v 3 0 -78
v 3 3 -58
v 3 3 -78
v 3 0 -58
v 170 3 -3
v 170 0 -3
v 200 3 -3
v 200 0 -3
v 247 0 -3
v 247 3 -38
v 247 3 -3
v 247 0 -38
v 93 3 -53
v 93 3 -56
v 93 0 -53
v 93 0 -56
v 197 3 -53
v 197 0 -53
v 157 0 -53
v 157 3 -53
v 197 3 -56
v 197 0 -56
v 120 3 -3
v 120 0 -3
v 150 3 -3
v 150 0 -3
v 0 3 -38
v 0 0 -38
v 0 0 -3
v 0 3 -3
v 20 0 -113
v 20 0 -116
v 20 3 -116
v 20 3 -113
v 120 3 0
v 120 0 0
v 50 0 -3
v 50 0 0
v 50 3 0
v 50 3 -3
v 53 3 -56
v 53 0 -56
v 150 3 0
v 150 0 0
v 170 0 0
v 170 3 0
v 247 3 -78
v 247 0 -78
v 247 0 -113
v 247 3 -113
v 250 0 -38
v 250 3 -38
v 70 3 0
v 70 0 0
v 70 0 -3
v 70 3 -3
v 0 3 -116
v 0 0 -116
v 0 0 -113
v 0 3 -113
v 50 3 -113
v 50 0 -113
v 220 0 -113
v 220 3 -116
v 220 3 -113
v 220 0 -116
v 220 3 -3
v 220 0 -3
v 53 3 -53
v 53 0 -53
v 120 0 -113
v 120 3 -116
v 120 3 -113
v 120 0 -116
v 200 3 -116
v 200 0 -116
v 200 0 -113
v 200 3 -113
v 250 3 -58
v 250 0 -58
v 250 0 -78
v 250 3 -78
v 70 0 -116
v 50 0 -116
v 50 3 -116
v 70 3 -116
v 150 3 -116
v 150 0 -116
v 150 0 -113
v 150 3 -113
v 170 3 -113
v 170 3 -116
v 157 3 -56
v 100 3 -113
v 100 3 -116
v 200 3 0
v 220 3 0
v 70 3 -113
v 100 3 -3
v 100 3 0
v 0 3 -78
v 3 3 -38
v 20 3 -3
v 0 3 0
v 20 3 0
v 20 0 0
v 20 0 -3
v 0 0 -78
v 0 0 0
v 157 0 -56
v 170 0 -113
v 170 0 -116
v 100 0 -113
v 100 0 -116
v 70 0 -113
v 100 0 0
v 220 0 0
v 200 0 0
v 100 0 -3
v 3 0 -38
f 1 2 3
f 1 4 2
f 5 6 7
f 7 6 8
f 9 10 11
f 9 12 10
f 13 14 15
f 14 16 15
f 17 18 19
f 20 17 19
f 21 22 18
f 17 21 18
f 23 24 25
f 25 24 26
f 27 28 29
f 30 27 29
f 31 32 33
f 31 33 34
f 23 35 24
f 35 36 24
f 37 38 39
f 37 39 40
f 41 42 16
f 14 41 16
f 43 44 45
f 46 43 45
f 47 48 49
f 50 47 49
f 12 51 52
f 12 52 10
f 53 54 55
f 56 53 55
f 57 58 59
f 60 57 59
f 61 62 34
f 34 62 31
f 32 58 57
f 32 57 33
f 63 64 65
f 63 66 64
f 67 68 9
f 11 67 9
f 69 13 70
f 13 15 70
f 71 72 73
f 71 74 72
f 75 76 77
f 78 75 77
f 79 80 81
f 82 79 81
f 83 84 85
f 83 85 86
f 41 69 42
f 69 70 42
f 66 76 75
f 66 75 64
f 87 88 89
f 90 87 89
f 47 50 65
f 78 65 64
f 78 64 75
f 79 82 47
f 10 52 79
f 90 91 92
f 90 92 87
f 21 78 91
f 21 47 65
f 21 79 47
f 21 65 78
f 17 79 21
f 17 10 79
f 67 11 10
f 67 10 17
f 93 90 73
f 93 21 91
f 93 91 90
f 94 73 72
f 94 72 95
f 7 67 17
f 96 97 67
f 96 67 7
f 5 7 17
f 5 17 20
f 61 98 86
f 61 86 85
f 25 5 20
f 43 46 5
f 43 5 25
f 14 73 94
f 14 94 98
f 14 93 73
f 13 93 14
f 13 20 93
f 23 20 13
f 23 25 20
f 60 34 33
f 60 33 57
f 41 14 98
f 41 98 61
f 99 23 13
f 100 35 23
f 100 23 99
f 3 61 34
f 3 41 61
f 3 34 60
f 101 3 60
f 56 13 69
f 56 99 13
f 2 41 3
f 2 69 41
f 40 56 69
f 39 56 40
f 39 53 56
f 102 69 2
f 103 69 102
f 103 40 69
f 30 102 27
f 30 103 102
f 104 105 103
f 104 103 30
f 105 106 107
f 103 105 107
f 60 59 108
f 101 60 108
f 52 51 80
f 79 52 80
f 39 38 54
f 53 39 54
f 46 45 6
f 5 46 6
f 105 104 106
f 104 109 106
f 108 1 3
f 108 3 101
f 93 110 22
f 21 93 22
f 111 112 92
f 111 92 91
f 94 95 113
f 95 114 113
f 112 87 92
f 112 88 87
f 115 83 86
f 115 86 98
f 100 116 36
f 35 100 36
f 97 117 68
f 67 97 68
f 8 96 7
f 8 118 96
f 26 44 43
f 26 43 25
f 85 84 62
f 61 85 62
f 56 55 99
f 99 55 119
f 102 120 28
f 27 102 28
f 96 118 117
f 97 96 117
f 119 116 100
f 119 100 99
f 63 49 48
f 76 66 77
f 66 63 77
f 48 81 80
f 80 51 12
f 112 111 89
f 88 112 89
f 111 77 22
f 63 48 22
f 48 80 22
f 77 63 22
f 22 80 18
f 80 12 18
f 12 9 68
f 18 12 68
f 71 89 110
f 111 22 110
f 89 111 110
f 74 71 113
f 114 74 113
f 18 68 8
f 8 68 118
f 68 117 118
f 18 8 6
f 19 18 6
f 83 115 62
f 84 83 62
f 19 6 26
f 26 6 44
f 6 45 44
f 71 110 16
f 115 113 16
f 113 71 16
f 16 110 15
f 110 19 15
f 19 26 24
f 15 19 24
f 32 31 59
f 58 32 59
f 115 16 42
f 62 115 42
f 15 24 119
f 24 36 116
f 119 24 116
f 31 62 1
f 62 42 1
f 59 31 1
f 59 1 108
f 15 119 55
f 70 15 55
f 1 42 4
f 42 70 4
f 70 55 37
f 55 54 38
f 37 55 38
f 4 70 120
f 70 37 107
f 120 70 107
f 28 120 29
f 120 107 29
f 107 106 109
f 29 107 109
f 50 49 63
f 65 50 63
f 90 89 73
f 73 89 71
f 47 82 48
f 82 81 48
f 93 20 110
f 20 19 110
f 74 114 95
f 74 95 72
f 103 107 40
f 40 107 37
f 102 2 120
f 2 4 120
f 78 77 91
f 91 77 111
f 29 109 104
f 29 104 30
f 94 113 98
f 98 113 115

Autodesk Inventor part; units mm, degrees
ref_plane "YZ Plane" through (0, 0, 0) normal (1, 0, 0) x (0, 1, 0)
ref_plane "XZ Plane" through (0, 0, 0) normal (0, 1, 0) x (-1, 0, 0)
ref_plane "XY Plane" through (0, 0, 0) normal (0, 0, 1) x (1, 0, 0)
sketch "Sketch1" plane through (0, 0, 0) normal (0, 1, 0) x (-1, 0, 0)
  line L0 (0, 0) -> (0, -3)
  line L1 (-250, -38) -> (-250, -78)
  line L2 (0, 0) -> (-20, 0)
  line L3 (-50, 0) -> (-50, -3)
  line L4 (-50, 0) -> (-70, 0)
  line L5 (-70, 0) -> (-70, -3)
  line L6 (-100, 0) -> (-100, -3)
  line L7 (-100, 0) -> (-120, 0)
  line L8 (-120, 0) -> (-120, -3)
  line L9 (-150, 0) -> (-150, -3)
  line L10 (-150, 0) -> (-170, 0)
  line L11 (-170, 0) -> (-170, -3)
  line L12 (-200, 0) -> (-200, -3)
  line L13 (-200, 0) -> (-220, 0)
  line L14 (-220, 0) -> (-220, -3)
  line L15 (-20, 0) -> (-20, -3)
  line L16 (-250, -58) -> (-250, -78)
  line L17 (-250, -78) -> (-247, -78)
  line L18 (-247, -78) -> (-247, -113)
  line L19 (-250, -58) -> (-250, -38)
  line L20 (-250, -38) -> (-247, -38)
  line L21 (-247, -38) -> (-247, -3)
  line L22 (-220, -3) -> (-247, -3)
  line L23 (-170, -3) -> (-200, -3)
  line L24 (-120, -3) -> (-150, -3)
  line L25 (-20, -3) -> (-50, -3)
  line L26 (-70, -3) -> (-100, -3)
  line L27 (0, -116) -> (0, -113)
  line L28 (0, -116) -> (-20, -116)
  line L29 (-50, -116) -> (-50, -113)
  line L30 (-50, -116) -> (-70, -116)
  line L31 (-70, -116) -> (-70, -113)
  line L32 (-100, -116) -> (-100, -113)
  line L33 (-100, -116) -> (-120, -116)
  line L34 (-120, -116) -> (-120, -113)
  line L35 (-150, -116) -> (-150, -113)
  line L36 (-150, -116) -> (-170, -116)
  line L37 (-170, -116) -> (-170, -113)
  line L38 (-200, -116) -> (-200, -113)
  line L39 (-200, -116) -> (-220, -116)
  line L40 (-220, -116) -> (-220, -113)
  line L41 (-20, -116) -> (-20, -113)
  line L42 (-3, -58) -> (-3, -78)
  line L43 (-3, -78) -> (0, -78)
  line L44 (-3, -58) -> (-3, -38)
  line L45 (-3, -38) -> (0, -38)
  line L46 (0, -113) -> (0, -78)
  line L47 (0, -38) -> (0, -3)
  line L48 (-50, -113) -> (-20, -113)
  line L49 (-100, -113) -> (-70, -113)
  line L50 (-150, -113) -> (-120, -113)
  line L51 (-247, -113) -> (-220, -113)
  line L52 (-200, -113) -> (-170, -113)
  line L53 (-53, -56) -> (-93, -56)
  line L54 (-93, -56) -> (-93, -53)
  line L55 (-93, -53) -> (-53, -53)
  line L56 (-53, -53) -> (-53, -56)
  line L57 (-197, -56) -> (-197, -53)
  line L58 (-197, -53) -> (-157, -53)
  line L59 (-157, -53) -> (-157, -56)
  line L60 (-157, -56) -> (-197, -56)
  dimension "d2" = 110
  dimension "d3" = 20
  dimension "d4" = 20
  dimension "d5" = 20
  dimension "d7" = 20
  dimension "d8" = 20
  dimension "d9" = 20
  dimension "d10" = 3
  dimension "d11" = 20
  dimension "d12" = 3
  dimension "d13" = 250
  dimension "d14" = 30
  dimension "d15" = 30
  dimension "d16" = 30
  dimension "d17" = 30
  dimension "d21" = 244
  dimension "d24" = 40
  dimension "d25" = 3
  dimension "d28" = 3
  dimension "d29" = 40
  dimension "d30" = 3
  dimension "d32" = 2
  dimension "d34" = 50
  dimension "d35" = 2
  dimension "d36" = 50
  dimension "d37" = 57
  dimension "d38" = 247
  dimension "d39" = 20
  dimension "d40" = 20
extrude "Extrusion2" add sketch "Sketch1" along normal blind 3
properties part number "latBack"
